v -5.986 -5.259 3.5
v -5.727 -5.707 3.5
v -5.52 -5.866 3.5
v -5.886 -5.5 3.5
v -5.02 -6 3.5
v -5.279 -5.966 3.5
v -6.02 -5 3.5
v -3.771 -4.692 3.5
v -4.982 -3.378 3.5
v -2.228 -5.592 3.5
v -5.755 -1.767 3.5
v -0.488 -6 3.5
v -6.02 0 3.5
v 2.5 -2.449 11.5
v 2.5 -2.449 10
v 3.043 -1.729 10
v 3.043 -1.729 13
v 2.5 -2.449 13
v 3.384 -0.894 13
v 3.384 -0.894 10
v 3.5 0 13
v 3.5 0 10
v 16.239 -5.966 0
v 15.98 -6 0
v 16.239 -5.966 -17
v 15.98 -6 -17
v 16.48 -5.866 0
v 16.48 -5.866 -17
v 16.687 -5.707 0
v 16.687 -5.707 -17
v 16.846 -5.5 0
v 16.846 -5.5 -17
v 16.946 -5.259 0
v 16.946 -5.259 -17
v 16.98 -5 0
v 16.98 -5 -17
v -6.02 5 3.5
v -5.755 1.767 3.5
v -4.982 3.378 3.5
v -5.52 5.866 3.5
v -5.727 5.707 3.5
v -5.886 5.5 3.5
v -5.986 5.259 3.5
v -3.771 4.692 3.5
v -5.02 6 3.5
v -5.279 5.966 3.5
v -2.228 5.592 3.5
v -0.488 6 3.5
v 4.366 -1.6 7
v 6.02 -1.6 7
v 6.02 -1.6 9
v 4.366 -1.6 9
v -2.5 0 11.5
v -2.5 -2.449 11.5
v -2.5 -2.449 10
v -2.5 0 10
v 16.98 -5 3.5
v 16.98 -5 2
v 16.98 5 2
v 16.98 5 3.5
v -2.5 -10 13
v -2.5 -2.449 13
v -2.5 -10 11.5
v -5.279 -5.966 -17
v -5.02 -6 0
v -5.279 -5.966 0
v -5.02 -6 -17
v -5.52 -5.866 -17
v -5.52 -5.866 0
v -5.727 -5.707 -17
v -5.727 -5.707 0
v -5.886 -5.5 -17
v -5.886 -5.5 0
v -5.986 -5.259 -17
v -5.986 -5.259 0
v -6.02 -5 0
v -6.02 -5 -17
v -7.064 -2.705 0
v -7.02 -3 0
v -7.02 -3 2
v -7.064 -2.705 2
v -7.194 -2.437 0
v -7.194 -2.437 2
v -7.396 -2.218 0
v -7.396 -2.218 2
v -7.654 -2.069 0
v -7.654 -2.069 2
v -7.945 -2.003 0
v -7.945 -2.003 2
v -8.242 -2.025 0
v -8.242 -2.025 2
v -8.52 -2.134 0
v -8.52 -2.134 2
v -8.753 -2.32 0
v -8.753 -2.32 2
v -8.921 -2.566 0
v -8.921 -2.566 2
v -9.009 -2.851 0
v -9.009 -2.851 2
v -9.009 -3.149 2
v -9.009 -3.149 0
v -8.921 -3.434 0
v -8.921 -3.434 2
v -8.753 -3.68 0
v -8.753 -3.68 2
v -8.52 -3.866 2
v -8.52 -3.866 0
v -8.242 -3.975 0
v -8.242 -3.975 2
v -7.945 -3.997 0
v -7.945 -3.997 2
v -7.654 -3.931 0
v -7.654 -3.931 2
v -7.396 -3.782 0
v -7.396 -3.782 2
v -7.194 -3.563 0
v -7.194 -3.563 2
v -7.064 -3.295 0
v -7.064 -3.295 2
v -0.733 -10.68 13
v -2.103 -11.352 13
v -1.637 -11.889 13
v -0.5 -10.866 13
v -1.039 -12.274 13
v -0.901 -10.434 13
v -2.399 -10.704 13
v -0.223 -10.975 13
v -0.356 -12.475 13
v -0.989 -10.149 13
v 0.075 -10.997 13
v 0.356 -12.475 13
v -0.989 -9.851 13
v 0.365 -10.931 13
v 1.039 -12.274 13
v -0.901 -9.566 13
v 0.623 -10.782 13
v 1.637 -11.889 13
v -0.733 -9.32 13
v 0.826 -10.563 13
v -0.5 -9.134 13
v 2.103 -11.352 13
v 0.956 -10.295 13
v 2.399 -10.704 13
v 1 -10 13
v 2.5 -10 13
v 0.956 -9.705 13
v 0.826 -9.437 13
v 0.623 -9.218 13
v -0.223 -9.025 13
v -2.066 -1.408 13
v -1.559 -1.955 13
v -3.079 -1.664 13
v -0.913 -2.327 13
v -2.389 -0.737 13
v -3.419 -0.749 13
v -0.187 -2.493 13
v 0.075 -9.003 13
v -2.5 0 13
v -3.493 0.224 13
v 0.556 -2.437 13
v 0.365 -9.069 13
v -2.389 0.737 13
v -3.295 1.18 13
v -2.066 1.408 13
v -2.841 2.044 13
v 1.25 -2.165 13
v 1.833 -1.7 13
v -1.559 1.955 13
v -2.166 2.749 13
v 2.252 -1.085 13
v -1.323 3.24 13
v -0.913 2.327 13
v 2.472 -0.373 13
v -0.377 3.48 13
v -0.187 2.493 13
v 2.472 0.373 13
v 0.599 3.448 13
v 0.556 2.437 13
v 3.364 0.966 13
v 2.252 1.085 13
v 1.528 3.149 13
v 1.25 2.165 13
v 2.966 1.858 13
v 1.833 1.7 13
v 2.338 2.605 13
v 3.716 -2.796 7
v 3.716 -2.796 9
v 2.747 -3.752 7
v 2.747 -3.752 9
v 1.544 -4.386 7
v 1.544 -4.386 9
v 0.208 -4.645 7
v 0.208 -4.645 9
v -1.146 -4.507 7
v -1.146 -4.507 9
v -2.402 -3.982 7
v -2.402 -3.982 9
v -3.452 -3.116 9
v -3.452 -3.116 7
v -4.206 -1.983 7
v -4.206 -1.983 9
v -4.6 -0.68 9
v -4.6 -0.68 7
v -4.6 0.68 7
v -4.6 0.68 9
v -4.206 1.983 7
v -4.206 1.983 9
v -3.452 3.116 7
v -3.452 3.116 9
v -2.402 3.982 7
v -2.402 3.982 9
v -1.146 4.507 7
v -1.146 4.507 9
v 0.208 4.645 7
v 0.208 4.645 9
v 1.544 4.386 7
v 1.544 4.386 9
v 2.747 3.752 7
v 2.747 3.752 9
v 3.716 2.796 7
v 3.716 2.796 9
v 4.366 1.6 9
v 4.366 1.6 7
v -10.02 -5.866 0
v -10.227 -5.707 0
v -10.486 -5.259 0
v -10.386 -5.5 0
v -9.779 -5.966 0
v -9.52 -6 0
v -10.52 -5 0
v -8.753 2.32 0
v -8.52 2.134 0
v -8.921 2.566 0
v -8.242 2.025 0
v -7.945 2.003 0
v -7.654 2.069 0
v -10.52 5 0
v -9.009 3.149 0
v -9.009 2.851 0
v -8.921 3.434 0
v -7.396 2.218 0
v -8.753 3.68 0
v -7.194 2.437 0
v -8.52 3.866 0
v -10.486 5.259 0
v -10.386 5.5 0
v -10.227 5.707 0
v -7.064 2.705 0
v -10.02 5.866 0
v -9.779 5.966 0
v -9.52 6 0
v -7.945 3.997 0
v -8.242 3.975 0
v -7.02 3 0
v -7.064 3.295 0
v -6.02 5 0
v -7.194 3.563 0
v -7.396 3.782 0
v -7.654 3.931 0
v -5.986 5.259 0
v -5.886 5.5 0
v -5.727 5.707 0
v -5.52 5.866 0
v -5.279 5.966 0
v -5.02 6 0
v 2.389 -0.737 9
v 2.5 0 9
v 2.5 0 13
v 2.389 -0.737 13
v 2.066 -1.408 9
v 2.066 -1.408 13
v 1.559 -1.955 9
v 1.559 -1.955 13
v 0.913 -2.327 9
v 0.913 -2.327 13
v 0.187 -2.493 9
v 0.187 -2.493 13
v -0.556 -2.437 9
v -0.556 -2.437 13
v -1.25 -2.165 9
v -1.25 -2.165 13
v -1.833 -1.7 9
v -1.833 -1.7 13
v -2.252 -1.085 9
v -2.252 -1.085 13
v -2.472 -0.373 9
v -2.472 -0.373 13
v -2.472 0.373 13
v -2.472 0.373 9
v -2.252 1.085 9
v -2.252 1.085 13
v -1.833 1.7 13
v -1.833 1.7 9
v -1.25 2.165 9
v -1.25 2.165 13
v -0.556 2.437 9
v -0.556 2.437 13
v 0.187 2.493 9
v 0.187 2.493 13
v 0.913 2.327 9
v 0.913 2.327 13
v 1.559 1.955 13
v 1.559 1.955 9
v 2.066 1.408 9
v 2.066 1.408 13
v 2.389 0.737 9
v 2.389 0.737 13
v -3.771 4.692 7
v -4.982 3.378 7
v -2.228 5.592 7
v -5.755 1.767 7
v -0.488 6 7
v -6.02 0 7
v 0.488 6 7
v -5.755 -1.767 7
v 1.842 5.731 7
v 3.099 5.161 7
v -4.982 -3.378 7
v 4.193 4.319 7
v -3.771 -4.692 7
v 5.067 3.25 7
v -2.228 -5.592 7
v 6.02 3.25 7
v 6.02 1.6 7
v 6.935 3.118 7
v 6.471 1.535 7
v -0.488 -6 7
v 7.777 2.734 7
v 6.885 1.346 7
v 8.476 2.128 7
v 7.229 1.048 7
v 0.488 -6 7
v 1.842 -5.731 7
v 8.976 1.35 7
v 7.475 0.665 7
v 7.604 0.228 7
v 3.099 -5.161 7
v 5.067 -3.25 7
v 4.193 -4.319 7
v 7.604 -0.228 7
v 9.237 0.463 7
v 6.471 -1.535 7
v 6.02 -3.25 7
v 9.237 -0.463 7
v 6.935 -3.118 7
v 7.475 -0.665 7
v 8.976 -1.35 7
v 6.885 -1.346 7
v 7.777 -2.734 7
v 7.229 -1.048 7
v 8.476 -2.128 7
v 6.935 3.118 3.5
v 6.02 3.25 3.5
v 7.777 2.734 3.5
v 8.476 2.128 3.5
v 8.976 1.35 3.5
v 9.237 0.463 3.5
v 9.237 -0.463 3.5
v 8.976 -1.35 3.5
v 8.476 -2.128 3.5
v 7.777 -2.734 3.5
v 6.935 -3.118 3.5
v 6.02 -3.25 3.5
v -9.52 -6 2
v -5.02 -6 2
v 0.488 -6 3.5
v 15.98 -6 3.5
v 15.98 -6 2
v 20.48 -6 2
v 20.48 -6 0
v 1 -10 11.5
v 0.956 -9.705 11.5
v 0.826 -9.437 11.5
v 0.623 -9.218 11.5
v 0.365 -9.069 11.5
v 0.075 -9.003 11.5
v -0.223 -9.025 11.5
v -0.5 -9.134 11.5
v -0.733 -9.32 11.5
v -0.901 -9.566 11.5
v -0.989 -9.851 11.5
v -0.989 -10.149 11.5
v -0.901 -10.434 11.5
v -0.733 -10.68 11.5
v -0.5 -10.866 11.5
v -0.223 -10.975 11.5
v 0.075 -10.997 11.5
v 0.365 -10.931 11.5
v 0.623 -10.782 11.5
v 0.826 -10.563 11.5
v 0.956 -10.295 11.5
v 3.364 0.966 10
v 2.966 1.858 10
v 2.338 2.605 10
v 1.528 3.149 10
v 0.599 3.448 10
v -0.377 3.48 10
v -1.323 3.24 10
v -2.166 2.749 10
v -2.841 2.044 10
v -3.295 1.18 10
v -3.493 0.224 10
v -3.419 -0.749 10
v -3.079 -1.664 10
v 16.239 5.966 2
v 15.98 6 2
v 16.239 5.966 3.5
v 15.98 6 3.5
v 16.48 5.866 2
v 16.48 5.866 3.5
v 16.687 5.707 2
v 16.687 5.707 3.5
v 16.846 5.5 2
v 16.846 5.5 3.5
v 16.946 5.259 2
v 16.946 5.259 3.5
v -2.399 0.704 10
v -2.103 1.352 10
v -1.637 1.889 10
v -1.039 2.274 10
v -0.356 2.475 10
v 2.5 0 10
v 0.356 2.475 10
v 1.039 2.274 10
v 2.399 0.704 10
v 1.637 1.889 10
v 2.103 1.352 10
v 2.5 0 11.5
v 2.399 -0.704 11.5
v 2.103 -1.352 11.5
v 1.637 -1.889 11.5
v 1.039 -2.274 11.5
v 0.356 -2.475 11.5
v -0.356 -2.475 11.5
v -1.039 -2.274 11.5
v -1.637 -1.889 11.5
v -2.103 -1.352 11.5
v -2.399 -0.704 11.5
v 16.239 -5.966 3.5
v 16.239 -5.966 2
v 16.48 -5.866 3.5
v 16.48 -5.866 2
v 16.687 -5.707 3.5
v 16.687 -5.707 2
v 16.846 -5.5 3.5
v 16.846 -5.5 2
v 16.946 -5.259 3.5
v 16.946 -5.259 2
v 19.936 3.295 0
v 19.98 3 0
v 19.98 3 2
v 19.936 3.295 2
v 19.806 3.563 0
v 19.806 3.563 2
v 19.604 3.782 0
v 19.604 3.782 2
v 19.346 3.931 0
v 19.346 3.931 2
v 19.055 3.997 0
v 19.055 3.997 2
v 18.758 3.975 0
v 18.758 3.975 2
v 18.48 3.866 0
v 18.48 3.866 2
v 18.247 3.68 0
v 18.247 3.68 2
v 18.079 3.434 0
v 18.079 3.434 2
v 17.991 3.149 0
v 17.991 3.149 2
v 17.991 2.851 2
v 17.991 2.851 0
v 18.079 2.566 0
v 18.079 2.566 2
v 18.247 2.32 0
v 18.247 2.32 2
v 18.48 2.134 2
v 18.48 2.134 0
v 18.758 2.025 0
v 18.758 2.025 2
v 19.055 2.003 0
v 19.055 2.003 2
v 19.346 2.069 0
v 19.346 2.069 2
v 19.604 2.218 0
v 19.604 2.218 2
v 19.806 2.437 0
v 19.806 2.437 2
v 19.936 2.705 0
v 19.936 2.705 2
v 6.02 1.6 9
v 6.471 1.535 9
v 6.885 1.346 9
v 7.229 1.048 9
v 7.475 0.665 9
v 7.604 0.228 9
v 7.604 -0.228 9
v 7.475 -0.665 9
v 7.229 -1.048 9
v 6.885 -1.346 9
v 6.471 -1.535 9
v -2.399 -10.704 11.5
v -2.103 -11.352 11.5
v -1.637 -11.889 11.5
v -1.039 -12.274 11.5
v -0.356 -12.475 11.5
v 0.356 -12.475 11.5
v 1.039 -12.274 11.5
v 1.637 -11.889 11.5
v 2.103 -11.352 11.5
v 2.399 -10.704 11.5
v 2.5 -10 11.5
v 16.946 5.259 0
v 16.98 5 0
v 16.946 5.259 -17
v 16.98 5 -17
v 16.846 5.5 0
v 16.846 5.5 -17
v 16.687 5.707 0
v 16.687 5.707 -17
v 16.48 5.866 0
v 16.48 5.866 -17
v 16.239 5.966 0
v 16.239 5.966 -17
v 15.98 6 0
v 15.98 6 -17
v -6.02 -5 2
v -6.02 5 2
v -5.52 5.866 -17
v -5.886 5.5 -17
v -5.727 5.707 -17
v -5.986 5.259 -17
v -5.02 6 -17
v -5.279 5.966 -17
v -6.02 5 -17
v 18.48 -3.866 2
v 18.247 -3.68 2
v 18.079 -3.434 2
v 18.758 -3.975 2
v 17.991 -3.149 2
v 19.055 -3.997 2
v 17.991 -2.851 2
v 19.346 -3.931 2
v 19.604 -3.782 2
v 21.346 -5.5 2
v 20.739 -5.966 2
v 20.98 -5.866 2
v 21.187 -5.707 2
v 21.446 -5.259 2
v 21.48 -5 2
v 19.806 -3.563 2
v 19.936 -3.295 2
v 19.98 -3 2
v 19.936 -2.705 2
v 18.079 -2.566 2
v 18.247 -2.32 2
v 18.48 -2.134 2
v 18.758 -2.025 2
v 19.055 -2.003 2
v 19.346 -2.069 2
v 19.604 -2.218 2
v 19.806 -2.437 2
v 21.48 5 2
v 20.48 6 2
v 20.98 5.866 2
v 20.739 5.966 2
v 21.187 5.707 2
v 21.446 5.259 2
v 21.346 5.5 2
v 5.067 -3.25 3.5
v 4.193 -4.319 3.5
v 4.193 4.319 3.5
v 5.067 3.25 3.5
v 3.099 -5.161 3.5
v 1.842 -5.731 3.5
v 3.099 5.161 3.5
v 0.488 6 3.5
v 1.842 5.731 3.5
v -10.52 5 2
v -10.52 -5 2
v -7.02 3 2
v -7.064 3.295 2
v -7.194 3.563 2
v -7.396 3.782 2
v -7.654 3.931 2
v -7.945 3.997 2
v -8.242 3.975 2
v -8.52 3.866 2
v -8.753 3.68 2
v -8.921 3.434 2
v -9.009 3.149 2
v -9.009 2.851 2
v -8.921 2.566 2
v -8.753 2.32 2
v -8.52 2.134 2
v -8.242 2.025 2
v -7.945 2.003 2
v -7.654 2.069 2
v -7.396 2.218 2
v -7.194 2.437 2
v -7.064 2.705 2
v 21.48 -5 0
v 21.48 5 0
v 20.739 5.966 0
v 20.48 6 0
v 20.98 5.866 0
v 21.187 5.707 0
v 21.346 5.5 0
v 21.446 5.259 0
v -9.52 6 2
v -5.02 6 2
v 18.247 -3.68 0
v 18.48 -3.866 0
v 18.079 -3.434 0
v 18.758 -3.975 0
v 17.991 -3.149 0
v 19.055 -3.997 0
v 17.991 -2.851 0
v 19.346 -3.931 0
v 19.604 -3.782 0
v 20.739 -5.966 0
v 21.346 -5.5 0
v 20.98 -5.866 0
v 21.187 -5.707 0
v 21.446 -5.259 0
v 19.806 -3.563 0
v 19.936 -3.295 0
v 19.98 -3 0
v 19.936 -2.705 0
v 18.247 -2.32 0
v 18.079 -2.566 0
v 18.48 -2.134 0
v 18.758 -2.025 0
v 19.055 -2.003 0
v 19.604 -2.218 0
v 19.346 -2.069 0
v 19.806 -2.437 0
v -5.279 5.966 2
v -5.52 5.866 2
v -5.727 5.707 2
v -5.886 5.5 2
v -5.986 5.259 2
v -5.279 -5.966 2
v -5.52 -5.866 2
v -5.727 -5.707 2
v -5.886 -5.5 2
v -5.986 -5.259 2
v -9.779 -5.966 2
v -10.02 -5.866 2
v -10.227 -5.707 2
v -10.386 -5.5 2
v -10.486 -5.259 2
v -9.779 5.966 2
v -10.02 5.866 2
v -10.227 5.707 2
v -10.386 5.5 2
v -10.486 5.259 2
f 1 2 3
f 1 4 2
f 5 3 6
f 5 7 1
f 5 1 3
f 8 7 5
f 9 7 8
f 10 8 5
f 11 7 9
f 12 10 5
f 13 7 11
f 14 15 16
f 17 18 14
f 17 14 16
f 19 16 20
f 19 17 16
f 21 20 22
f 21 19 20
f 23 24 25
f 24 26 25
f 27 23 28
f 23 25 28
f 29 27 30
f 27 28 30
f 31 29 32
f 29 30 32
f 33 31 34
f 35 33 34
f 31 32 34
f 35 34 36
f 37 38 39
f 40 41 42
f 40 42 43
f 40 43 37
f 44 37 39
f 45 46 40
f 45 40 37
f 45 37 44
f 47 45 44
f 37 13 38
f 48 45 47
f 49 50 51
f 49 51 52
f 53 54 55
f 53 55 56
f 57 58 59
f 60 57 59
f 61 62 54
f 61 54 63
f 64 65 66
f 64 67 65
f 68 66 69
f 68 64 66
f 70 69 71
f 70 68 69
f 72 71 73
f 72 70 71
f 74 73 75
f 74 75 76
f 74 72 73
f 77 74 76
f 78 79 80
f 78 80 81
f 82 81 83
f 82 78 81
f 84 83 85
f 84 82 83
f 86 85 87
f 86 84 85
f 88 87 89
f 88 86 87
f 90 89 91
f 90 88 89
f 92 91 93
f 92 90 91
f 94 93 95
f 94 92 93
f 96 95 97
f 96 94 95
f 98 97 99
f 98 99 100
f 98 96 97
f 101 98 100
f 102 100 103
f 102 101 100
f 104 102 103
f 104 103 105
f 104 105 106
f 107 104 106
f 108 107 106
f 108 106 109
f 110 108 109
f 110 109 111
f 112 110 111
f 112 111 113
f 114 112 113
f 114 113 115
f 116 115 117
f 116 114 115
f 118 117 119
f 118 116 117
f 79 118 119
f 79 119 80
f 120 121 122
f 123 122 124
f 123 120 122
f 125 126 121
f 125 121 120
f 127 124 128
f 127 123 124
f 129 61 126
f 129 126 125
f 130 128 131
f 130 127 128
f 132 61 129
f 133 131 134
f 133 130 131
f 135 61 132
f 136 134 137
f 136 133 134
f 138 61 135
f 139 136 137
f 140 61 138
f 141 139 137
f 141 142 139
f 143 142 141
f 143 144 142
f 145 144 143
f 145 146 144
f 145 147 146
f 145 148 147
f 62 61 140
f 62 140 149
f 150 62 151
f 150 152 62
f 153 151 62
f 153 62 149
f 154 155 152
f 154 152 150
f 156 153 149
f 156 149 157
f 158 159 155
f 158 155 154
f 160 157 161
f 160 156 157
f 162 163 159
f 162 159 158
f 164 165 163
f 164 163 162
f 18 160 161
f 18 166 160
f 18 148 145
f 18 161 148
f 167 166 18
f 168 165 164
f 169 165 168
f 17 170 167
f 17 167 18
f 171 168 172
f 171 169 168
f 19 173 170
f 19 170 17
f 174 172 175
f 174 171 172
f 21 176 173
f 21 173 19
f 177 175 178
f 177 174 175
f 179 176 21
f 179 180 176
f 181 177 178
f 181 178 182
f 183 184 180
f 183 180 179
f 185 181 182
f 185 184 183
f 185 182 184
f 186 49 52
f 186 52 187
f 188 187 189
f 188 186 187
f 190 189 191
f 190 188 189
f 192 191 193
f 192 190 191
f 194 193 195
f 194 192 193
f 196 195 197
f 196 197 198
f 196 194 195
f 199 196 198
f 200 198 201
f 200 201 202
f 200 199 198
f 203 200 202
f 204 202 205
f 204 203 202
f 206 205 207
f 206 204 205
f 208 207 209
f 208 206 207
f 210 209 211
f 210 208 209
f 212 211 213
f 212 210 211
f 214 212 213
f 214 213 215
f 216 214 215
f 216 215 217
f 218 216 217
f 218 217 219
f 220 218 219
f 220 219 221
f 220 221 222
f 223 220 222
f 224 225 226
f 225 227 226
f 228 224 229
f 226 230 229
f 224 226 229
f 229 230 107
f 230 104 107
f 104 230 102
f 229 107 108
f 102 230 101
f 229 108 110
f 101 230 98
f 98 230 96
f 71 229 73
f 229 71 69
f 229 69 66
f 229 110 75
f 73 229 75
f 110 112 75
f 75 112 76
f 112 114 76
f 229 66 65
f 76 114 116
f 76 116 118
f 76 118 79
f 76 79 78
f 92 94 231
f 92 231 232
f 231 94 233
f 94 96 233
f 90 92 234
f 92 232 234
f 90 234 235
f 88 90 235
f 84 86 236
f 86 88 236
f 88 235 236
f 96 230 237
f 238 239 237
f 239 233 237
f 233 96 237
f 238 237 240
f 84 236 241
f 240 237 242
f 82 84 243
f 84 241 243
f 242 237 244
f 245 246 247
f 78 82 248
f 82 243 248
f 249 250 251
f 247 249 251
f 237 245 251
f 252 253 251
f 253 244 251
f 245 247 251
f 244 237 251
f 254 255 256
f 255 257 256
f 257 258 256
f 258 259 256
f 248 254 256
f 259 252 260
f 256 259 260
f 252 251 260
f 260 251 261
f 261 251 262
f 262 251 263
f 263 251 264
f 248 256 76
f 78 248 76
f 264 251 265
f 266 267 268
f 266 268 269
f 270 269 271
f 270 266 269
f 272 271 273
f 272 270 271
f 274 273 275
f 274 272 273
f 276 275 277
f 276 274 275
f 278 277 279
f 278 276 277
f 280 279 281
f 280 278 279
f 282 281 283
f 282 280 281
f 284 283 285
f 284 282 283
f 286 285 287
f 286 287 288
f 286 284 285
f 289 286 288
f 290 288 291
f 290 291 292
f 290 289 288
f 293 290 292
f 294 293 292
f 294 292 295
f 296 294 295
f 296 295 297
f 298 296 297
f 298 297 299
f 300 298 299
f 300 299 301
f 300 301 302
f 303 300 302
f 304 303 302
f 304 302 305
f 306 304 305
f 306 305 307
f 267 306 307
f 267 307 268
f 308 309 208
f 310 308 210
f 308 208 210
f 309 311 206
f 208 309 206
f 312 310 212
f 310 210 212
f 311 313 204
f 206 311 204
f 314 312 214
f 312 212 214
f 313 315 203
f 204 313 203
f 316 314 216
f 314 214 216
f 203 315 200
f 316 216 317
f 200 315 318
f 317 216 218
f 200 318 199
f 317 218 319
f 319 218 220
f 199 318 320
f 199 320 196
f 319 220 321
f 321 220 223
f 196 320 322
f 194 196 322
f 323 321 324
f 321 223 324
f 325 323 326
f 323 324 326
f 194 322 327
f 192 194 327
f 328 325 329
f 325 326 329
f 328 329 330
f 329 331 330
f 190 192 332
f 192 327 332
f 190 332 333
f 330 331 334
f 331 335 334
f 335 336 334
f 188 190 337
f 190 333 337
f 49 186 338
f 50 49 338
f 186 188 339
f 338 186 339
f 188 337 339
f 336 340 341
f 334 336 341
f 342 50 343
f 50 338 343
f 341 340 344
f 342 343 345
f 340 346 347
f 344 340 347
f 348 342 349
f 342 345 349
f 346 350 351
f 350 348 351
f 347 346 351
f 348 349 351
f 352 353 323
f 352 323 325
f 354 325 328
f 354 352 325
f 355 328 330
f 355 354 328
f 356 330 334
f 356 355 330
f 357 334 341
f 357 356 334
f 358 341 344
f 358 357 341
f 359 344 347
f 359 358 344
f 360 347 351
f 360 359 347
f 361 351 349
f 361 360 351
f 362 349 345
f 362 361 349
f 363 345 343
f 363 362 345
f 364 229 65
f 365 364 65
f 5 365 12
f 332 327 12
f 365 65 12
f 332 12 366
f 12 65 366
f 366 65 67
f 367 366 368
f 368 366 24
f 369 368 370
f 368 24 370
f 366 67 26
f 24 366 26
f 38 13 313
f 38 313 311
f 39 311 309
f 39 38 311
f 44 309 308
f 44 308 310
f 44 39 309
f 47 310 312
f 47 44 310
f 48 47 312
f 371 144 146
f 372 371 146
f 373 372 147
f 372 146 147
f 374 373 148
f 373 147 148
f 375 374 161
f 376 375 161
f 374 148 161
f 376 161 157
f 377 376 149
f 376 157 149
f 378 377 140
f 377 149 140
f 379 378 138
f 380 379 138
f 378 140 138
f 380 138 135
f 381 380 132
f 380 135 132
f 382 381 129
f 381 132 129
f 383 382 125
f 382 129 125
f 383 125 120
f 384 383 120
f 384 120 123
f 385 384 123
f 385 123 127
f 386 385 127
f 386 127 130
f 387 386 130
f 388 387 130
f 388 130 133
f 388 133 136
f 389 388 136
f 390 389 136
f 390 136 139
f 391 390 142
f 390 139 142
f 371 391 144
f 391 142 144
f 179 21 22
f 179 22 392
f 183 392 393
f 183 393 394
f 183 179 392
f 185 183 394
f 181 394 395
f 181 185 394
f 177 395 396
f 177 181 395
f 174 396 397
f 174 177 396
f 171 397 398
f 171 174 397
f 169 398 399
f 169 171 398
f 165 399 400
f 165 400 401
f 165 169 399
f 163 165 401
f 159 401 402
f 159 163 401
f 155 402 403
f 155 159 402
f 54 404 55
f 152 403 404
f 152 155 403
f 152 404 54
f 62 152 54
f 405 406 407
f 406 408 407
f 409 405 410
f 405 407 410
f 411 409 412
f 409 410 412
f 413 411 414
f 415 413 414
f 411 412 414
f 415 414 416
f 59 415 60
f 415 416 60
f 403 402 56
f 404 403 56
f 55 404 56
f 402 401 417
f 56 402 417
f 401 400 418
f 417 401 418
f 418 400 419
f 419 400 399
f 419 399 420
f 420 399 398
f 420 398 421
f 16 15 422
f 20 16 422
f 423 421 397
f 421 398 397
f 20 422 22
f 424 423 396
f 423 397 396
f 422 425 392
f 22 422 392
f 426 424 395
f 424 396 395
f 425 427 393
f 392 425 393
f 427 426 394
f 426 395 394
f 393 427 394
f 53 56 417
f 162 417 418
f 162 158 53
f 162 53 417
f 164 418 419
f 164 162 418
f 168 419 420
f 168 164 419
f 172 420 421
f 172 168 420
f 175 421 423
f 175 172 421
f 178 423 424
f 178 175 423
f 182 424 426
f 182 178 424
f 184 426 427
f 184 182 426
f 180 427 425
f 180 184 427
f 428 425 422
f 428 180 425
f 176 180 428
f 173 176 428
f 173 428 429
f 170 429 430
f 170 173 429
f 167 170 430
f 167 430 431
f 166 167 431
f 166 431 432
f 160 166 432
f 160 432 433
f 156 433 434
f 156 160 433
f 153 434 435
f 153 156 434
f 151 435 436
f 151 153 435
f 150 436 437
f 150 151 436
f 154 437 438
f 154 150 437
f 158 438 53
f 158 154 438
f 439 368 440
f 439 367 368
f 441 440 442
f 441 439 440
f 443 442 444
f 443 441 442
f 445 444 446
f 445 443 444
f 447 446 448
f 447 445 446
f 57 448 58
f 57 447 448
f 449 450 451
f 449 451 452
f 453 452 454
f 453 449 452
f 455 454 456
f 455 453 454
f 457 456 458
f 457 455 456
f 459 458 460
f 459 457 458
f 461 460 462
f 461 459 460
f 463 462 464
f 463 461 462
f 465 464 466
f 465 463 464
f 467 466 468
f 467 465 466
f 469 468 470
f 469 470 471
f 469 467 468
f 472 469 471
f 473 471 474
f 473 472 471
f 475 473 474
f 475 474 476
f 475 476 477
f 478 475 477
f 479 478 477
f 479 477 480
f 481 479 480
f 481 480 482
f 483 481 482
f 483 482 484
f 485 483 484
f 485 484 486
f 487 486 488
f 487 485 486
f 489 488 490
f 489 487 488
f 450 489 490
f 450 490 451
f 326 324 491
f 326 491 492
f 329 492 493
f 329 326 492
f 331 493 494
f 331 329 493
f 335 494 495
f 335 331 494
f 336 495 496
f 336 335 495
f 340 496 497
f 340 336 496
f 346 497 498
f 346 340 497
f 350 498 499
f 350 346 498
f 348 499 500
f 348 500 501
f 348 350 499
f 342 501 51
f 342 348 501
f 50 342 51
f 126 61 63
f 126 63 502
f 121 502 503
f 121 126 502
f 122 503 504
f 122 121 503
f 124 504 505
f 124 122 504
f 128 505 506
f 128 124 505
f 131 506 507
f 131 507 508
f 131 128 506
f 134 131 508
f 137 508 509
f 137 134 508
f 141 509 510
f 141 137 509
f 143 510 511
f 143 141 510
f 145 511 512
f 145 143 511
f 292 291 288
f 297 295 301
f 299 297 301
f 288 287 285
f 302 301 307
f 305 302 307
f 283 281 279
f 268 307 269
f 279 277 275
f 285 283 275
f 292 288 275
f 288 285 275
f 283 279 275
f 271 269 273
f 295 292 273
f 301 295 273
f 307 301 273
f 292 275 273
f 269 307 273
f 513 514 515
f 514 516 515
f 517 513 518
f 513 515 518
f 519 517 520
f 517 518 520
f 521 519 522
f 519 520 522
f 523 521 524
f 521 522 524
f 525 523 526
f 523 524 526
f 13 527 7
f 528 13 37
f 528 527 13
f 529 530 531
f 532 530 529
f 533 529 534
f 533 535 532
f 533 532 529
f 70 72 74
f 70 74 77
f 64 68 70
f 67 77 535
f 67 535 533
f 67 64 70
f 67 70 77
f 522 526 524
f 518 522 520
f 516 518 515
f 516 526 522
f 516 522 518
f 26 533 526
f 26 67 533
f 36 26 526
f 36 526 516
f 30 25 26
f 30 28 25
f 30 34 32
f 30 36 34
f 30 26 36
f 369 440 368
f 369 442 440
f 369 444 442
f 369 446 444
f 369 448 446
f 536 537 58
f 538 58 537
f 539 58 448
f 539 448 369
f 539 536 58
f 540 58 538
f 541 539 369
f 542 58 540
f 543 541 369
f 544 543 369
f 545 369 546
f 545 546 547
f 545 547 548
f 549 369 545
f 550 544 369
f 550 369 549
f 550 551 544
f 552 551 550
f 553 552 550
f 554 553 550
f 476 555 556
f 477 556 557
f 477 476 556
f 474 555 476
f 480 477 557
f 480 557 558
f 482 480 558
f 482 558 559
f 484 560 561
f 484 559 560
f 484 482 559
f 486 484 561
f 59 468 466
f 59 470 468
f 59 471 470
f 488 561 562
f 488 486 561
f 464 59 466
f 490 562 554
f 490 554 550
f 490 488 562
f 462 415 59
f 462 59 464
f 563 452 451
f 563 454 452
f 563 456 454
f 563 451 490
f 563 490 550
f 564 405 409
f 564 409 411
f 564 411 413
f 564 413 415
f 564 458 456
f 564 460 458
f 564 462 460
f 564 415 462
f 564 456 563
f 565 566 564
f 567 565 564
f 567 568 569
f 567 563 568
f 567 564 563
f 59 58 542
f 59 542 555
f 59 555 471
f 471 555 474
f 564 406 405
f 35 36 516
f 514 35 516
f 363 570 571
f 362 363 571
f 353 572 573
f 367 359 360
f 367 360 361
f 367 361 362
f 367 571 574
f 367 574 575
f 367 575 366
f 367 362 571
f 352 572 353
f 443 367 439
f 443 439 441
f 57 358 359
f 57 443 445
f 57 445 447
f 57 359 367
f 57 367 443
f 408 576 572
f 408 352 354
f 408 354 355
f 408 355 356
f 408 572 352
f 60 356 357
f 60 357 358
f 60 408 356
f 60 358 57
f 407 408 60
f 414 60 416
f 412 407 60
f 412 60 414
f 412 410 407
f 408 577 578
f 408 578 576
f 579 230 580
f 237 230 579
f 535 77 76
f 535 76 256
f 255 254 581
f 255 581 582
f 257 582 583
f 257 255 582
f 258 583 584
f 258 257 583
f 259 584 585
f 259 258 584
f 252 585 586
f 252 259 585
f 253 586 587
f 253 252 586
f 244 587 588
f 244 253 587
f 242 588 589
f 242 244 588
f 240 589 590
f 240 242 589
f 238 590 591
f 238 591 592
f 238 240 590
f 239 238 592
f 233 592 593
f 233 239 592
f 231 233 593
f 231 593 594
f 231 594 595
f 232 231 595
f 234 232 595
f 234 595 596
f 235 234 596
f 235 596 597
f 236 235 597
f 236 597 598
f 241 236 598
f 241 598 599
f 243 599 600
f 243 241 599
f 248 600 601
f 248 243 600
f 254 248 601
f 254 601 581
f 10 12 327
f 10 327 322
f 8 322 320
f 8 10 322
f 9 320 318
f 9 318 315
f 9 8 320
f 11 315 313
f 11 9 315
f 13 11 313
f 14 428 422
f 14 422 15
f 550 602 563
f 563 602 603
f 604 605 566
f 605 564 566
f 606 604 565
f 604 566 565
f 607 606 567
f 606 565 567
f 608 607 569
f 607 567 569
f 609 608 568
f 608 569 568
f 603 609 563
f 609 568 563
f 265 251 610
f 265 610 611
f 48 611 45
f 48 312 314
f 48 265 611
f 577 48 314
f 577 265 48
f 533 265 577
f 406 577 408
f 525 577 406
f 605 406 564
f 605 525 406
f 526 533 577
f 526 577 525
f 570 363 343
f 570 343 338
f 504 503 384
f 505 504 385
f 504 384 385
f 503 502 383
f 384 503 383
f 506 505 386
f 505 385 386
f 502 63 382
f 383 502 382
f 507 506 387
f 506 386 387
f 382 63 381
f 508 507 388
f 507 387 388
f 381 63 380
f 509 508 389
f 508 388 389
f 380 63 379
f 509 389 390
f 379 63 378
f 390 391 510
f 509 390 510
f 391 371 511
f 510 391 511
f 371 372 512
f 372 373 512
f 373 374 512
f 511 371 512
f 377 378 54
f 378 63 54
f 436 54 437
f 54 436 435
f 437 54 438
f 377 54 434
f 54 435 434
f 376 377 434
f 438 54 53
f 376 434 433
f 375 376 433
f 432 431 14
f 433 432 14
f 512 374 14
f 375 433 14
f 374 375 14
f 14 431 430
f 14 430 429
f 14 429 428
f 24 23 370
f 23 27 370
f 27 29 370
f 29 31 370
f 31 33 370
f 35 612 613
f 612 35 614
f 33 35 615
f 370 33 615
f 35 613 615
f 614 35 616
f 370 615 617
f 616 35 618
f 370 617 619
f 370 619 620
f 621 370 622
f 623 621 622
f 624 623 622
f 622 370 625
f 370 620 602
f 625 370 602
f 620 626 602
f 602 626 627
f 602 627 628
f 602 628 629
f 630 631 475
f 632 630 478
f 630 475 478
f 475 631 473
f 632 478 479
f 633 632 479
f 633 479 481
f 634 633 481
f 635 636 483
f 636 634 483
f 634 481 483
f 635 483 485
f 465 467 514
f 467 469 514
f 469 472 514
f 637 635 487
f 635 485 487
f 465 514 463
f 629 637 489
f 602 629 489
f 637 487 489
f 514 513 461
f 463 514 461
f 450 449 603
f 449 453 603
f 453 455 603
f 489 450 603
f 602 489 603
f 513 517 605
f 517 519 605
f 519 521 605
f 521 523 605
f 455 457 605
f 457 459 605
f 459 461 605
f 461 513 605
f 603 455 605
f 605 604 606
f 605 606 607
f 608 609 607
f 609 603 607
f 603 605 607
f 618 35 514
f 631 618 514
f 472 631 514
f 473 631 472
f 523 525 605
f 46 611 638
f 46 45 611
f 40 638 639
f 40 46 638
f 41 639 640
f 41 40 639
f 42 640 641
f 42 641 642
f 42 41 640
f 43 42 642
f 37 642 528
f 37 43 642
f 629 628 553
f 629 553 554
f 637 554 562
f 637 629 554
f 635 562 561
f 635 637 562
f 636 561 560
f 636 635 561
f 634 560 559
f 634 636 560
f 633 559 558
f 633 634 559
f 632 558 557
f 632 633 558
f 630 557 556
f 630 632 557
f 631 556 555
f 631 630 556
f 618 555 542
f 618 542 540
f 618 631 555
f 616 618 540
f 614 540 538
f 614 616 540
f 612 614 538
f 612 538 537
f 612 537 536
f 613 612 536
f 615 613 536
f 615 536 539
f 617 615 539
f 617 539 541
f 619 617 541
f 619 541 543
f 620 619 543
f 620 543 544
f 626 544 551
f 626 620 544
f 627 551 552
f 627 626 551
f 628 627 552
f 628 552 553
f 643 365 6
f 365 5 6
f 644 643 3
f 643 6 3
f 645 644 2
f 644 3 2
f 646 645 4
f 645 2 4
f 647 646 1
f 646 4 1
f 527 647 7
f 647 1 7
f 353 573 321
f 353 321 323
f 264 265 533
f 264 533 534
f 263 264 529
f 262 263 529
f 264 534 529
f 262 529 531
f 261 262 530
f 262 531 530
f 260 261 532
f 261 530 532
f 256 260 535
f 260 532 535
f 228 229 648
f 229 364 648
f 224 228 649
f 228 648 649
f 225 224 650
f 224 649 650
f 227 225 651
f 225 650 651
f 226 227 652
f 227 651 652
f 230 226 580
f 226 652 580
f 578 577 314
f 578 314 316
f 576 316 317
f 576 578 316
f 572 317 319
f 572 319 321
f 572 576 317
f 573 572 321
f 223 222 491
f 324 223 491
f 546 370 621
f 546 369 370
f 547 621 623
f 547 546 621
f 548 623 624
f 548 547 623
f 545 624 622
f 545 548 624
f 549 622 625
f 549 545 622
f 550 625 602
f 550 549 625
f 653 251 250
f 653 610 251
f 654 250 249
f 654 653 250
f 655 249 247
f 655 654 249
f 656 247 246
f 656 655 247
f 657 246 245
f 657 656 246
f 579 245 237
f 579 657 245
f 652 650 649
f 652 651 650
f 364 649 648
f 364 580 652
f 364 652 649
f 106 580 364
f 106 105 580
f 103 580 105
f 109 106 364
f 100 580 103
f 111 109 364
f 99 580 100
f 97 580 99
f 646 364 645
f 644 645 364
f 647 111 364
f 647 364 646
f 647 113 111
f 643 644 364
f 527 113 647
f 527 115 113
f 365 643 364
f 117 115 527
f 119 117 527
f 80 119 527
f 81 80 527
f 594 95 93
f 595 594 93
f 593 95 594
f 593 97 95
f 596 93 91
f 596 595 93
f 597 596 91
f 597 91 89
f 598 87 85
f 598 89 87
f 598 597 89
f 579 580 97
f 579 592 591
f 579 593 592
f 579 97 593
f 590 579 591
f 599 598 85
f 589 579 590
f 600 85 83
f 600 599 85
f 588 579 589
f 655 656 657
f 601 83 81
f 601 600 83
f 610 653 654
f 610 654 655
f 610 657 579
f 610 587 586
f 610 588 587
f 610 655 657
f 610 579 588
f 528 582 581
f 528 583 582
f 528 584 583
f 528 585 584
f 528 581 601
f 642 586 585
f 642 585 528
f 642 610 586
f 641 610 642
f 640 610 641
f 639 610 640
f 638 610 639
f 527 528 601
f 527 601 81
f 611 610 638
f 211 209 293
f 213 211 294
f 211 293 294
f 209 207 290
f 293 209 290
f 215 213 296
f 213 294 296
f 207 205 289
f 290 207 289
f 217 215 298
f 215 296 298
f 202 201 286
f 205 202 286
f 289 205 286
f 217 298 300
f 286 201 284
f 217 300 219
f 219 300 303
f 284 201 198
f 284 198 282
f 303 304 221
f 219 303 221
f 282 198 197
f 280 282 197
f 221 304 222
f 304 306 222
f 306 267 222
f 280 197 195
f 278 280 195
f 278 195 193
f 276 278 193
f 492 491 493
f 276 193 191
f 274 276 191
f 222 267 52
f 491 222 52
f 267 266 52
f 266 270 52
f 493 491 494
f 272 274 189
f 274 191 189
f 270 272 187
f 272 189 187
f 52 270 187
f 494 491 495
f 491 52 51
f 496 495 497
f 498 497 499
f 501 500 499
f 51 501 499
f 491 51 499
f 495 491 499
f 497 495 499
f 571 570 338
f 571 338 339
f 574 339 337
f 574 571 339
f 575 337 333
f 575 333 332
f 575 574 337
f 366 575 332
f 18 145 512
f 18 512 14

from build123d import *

# Parameters (mm, degrees)
F0_W      = 23
F0_H      = 12
F1_DEPTH  = 17
F2_W      = 32
F2_H      = 12
F2_R      = 1
F3_DEPTH  = 2
F5_DEPTH  = 24
F6_DEPTH  = 26
F7_DEPTH  = 3.5
F8_R      = 1
F9_R      = 2.5
F10_DEPTH = 30
F11_R     = 1
F12_DEPTH = 1.5
F13_DEPTH = 3


with BuildPart() as f1:
    # F0 (on Top) → F1 (new body)
    with BuildSketch(Plane.XY):
        with Locations((5.4802, 0)):
            Rectangle(F0_W, F0_H)
    extrude(amount=-F1_DEPTH)

    # F2 (on face) → F3 (join)
    with BuildSketch(Plane.XY):
        with Locations((5.4802, 0)):
            Rectangle(F2_W, F2_H)
        with Locations((-8.0198, -3)):
            Circle(F2_R, mode=Mode.SUBTRACT)
        with Locations((18.9802, -3)):
            Circle(F2_R, mode=Mode.SUBTRACT)
        with Locations((-8.0198, 3)):
            Circle(F2_R, mode=Mode.SUBTRACT)
        with Locations((18.9802, 3)):
            Circle(F2_R, mode=Mode.SUBTRACT)
    extrude(amount=F3_DEPTH)

    # F4 (on face) → F5 (join)
    with BuildSketch(Plane(origin=(0, 0, -17), x_dir=(1, 0, 0), z_dir=(0, 0, -1))):
        with BuildLine():
            ThreePointArc((0.4878442784, -6), (3.0991891911, -5.1607187869), (5.0670989767, -3.25))
            Line((5.0670989767, -3.25), (6.0198, -3.25))
            ThreePointArc((6.0198, -3.25), (9.2698, 0), (6.0198, 3.25))
            Line((6.0198, 3.25), (5.0670989767, 3.25))
            ThreePointArc((5.0670989767, 3.25), (3.0991891911, 5.1607187869), (0.4878442784, 6))
            Line((0.4878442784, 6), (-0.4878442784, 6))
            ThreePointArc((-0.4878442784, 6), (-4.4257607836, 4.0805187815), (-6.0198, 0))
            ThreePointArc((-6.0198, 0), (-4.4257607836, -4.0805187815), (-0.4878442784, -6))
            Line((-0.4878442784, -6), (0.4878442784, -6))
        make_face()
        with BuildLine():
            Line((6.0198, -1.6), (5.8032742517, -1.6))
            Line((5.8032742517, -1.6), (4.3660622991, -1.6))
            ThreePointArc((4.3660622991, -1.6), (-4.65, 0), (4.3660622991, 1.6))
            Line((4.3660622991, 1.6), (6.0198, 1.6))
            ThreePointArc((6.0198, 1.6), (7.6198, 0), (6.0198, -1.6))
        make_face(mode=Mode.SUBTRACT)
        with BuildLine():
            ThreePointArc((4.3660622991, 1.6), (-4.65, 0), (4.3660622991, -1.6))
            ThreePointArc((4.3660622991, -1.6), (4.5784653374, -0.8124993258), (4.65, 0))
            ThreePointArc((4.65, 0), (4.5784653374, 0.8124993258), (4.3660622991, 1.6))
        make_face()
        with BuildLine():
            Line((4.3660622991, -1.6), (5.8032742517, -1.6))
            Line((5.8032742517, -1.6), (6.0198, -1.6))
            ThreePointArc((6.0198, -1.6), (7.6198, 0), (6.0198, 1.6))
            Line((6.0198, 1.6), (4.3660622991, 1.6))
            ThreePointArc((4.3660622991, 1.6), (4.5784653374, 0.8124993258), (4.65, 0))
            ThreePointArc((4.65, 0), (4.5784653374, -0.8124993258), (4.3660622991, -1.6))
        make_face()
    extrude(amount=-F5_DEPTH)

    # F4 (on face) → F6 (join)
    with BuildSketch(Plane(origin=(0, 0, -17), x_dir=(1, 0, 0), z_dir=(0, 0, -1))):
        with BuildLine():
            ThreePointArc((4.3660622991, 1.6), (-4.65, 0), (4.3660622991, -1.6))
            ThreePointArc((4.3660622991, -1.6), (4.5784653374, -0.8124993258), (4.65, 0))
            ThreePointArc((4.65, 0), (4.5784653374, 0.8124993258), (4.3660622991, 1.6))
        make_face()
        with BuildLine():
            Line((4.3660622991, -1.6), (5.8032742517, -1.6))
            Line((5.8032742517, -1.6), (6.0198, -1.6))
            ThreePointArc((6.0198, -1.6), (7.6198, 0), (6.0198, 1.6))
            Line((6.0198, 1.6), (4.3660622991, 1.6))
            ThreePointArc((4.3660622991, 1.6), (4.5784653374, 0.8124993258), (4.65, 0))
            ThreePointArc((4.65, 0), (4.5784653374, -0.8124993258), (4.3660622991, -1.6))
        make_face()
    extrude(amount=-F6_DEPTH)

    # F0 (on Top) → F7 (join)
    with BuildSketch(Plane.XY):
        with Locations((5.4802, 0)):
            Rectangle(F0_W, F0_H)
    extrude(amount=F7_DEPTH)

    # F8
    f8_edges = [f1.edges().sort_by_distance(p)[0] for p in [
        (16.9802, -6, -8.5),
        (16.9802, 6, -8.5),
        (-6.0198, -6, -8.5),
        (-6.0198, 6, -8.5),
        (-10.5198, -6, 1),
        (-10.5198, 6, 1),
        (21.4802, 6, 1),
        (21.4802, -6, 1),
        (16.9802, 6, 2.75),
        (16.9802, -6, 2.75),
        (-6.0198, 6, 2.75),
        (-6.0198, -6, 2.75),
    ]]
    fillet(f8_edges, radius=F8_R)

    # F9 (on face) → F10 (join)
    with BuildSketch(Plane(origin=(0, 0, -17), x_dir=(1, 0, 0), z_dir=(0, 0, -1))):
        Circle(F9_R)
    extrude(amount=-F10_DEPTH)


with BuildPart() as f12:
    # F11 (on face) → F12 (new body)
    with BuildSketch(Plane.XY.offset(13)):
        with BuildLine():
            ThreePointArc((-2.5, -10), (0, -7.5), (2.5, -10))
            Line((2.5, -10), (2.5, -2.4494897428))
            ThreePointArc((2.5, -2.4494897428), (0, -3.5), (-2.5, -2.4494897428))
            Line((-2.5, -2.4494897428), (-2.5, -10))
        make_face()
        with BuildLine():
            ThreePointArc((-2.5, -2.4494897428), (0, -3.5), (2.5, -2.4494897428))
            Line((2.5, -2.4494897428), (2.5, 0))
            ThreePointArc((2.5, 0), (0, -2.5), (-2.5, 0))
            Line((-2.5, 0), (-2.5, -2.4494897428))
        make_face()
        with BuildLine():
            ThreePointArc((-2.5, -10), (0, -12.5), (2.5, -10))
            ThreePointArc((2.5, -10), (0, -7.5), (-2.5, -10))
        make_face()
        with Locations((0, -10)):
            Circle(F11_R, mode=Mode.SUBTRACT)
    extrude(amount=-F12_DEPTH)

    # F11 (on face) → F13 (join)
    with BuildSketch(Plane.XY.offset(13)):
        with BuildLine():
            Line((2.5, 0), (2.5, -2.4494897428))
            ThreePointArc((2.5, -2.4494897428), (3.2403703492, -1.3228756555), (3.5, 0))
            ThreePointArc((3.5, 0), (-1.3228756555, 3.2403703492), (-2.5, -2.4494897428))
            Line((-2.5, -2.4494897428), (-2.5, 0))
            ThreePointArc((-2.5, 0), (0, 2.5), (2.5, 0))
        make_face()
    extrude(amount=-F13_DEPTH)


solid = Compound([f1.part, f12.part])
